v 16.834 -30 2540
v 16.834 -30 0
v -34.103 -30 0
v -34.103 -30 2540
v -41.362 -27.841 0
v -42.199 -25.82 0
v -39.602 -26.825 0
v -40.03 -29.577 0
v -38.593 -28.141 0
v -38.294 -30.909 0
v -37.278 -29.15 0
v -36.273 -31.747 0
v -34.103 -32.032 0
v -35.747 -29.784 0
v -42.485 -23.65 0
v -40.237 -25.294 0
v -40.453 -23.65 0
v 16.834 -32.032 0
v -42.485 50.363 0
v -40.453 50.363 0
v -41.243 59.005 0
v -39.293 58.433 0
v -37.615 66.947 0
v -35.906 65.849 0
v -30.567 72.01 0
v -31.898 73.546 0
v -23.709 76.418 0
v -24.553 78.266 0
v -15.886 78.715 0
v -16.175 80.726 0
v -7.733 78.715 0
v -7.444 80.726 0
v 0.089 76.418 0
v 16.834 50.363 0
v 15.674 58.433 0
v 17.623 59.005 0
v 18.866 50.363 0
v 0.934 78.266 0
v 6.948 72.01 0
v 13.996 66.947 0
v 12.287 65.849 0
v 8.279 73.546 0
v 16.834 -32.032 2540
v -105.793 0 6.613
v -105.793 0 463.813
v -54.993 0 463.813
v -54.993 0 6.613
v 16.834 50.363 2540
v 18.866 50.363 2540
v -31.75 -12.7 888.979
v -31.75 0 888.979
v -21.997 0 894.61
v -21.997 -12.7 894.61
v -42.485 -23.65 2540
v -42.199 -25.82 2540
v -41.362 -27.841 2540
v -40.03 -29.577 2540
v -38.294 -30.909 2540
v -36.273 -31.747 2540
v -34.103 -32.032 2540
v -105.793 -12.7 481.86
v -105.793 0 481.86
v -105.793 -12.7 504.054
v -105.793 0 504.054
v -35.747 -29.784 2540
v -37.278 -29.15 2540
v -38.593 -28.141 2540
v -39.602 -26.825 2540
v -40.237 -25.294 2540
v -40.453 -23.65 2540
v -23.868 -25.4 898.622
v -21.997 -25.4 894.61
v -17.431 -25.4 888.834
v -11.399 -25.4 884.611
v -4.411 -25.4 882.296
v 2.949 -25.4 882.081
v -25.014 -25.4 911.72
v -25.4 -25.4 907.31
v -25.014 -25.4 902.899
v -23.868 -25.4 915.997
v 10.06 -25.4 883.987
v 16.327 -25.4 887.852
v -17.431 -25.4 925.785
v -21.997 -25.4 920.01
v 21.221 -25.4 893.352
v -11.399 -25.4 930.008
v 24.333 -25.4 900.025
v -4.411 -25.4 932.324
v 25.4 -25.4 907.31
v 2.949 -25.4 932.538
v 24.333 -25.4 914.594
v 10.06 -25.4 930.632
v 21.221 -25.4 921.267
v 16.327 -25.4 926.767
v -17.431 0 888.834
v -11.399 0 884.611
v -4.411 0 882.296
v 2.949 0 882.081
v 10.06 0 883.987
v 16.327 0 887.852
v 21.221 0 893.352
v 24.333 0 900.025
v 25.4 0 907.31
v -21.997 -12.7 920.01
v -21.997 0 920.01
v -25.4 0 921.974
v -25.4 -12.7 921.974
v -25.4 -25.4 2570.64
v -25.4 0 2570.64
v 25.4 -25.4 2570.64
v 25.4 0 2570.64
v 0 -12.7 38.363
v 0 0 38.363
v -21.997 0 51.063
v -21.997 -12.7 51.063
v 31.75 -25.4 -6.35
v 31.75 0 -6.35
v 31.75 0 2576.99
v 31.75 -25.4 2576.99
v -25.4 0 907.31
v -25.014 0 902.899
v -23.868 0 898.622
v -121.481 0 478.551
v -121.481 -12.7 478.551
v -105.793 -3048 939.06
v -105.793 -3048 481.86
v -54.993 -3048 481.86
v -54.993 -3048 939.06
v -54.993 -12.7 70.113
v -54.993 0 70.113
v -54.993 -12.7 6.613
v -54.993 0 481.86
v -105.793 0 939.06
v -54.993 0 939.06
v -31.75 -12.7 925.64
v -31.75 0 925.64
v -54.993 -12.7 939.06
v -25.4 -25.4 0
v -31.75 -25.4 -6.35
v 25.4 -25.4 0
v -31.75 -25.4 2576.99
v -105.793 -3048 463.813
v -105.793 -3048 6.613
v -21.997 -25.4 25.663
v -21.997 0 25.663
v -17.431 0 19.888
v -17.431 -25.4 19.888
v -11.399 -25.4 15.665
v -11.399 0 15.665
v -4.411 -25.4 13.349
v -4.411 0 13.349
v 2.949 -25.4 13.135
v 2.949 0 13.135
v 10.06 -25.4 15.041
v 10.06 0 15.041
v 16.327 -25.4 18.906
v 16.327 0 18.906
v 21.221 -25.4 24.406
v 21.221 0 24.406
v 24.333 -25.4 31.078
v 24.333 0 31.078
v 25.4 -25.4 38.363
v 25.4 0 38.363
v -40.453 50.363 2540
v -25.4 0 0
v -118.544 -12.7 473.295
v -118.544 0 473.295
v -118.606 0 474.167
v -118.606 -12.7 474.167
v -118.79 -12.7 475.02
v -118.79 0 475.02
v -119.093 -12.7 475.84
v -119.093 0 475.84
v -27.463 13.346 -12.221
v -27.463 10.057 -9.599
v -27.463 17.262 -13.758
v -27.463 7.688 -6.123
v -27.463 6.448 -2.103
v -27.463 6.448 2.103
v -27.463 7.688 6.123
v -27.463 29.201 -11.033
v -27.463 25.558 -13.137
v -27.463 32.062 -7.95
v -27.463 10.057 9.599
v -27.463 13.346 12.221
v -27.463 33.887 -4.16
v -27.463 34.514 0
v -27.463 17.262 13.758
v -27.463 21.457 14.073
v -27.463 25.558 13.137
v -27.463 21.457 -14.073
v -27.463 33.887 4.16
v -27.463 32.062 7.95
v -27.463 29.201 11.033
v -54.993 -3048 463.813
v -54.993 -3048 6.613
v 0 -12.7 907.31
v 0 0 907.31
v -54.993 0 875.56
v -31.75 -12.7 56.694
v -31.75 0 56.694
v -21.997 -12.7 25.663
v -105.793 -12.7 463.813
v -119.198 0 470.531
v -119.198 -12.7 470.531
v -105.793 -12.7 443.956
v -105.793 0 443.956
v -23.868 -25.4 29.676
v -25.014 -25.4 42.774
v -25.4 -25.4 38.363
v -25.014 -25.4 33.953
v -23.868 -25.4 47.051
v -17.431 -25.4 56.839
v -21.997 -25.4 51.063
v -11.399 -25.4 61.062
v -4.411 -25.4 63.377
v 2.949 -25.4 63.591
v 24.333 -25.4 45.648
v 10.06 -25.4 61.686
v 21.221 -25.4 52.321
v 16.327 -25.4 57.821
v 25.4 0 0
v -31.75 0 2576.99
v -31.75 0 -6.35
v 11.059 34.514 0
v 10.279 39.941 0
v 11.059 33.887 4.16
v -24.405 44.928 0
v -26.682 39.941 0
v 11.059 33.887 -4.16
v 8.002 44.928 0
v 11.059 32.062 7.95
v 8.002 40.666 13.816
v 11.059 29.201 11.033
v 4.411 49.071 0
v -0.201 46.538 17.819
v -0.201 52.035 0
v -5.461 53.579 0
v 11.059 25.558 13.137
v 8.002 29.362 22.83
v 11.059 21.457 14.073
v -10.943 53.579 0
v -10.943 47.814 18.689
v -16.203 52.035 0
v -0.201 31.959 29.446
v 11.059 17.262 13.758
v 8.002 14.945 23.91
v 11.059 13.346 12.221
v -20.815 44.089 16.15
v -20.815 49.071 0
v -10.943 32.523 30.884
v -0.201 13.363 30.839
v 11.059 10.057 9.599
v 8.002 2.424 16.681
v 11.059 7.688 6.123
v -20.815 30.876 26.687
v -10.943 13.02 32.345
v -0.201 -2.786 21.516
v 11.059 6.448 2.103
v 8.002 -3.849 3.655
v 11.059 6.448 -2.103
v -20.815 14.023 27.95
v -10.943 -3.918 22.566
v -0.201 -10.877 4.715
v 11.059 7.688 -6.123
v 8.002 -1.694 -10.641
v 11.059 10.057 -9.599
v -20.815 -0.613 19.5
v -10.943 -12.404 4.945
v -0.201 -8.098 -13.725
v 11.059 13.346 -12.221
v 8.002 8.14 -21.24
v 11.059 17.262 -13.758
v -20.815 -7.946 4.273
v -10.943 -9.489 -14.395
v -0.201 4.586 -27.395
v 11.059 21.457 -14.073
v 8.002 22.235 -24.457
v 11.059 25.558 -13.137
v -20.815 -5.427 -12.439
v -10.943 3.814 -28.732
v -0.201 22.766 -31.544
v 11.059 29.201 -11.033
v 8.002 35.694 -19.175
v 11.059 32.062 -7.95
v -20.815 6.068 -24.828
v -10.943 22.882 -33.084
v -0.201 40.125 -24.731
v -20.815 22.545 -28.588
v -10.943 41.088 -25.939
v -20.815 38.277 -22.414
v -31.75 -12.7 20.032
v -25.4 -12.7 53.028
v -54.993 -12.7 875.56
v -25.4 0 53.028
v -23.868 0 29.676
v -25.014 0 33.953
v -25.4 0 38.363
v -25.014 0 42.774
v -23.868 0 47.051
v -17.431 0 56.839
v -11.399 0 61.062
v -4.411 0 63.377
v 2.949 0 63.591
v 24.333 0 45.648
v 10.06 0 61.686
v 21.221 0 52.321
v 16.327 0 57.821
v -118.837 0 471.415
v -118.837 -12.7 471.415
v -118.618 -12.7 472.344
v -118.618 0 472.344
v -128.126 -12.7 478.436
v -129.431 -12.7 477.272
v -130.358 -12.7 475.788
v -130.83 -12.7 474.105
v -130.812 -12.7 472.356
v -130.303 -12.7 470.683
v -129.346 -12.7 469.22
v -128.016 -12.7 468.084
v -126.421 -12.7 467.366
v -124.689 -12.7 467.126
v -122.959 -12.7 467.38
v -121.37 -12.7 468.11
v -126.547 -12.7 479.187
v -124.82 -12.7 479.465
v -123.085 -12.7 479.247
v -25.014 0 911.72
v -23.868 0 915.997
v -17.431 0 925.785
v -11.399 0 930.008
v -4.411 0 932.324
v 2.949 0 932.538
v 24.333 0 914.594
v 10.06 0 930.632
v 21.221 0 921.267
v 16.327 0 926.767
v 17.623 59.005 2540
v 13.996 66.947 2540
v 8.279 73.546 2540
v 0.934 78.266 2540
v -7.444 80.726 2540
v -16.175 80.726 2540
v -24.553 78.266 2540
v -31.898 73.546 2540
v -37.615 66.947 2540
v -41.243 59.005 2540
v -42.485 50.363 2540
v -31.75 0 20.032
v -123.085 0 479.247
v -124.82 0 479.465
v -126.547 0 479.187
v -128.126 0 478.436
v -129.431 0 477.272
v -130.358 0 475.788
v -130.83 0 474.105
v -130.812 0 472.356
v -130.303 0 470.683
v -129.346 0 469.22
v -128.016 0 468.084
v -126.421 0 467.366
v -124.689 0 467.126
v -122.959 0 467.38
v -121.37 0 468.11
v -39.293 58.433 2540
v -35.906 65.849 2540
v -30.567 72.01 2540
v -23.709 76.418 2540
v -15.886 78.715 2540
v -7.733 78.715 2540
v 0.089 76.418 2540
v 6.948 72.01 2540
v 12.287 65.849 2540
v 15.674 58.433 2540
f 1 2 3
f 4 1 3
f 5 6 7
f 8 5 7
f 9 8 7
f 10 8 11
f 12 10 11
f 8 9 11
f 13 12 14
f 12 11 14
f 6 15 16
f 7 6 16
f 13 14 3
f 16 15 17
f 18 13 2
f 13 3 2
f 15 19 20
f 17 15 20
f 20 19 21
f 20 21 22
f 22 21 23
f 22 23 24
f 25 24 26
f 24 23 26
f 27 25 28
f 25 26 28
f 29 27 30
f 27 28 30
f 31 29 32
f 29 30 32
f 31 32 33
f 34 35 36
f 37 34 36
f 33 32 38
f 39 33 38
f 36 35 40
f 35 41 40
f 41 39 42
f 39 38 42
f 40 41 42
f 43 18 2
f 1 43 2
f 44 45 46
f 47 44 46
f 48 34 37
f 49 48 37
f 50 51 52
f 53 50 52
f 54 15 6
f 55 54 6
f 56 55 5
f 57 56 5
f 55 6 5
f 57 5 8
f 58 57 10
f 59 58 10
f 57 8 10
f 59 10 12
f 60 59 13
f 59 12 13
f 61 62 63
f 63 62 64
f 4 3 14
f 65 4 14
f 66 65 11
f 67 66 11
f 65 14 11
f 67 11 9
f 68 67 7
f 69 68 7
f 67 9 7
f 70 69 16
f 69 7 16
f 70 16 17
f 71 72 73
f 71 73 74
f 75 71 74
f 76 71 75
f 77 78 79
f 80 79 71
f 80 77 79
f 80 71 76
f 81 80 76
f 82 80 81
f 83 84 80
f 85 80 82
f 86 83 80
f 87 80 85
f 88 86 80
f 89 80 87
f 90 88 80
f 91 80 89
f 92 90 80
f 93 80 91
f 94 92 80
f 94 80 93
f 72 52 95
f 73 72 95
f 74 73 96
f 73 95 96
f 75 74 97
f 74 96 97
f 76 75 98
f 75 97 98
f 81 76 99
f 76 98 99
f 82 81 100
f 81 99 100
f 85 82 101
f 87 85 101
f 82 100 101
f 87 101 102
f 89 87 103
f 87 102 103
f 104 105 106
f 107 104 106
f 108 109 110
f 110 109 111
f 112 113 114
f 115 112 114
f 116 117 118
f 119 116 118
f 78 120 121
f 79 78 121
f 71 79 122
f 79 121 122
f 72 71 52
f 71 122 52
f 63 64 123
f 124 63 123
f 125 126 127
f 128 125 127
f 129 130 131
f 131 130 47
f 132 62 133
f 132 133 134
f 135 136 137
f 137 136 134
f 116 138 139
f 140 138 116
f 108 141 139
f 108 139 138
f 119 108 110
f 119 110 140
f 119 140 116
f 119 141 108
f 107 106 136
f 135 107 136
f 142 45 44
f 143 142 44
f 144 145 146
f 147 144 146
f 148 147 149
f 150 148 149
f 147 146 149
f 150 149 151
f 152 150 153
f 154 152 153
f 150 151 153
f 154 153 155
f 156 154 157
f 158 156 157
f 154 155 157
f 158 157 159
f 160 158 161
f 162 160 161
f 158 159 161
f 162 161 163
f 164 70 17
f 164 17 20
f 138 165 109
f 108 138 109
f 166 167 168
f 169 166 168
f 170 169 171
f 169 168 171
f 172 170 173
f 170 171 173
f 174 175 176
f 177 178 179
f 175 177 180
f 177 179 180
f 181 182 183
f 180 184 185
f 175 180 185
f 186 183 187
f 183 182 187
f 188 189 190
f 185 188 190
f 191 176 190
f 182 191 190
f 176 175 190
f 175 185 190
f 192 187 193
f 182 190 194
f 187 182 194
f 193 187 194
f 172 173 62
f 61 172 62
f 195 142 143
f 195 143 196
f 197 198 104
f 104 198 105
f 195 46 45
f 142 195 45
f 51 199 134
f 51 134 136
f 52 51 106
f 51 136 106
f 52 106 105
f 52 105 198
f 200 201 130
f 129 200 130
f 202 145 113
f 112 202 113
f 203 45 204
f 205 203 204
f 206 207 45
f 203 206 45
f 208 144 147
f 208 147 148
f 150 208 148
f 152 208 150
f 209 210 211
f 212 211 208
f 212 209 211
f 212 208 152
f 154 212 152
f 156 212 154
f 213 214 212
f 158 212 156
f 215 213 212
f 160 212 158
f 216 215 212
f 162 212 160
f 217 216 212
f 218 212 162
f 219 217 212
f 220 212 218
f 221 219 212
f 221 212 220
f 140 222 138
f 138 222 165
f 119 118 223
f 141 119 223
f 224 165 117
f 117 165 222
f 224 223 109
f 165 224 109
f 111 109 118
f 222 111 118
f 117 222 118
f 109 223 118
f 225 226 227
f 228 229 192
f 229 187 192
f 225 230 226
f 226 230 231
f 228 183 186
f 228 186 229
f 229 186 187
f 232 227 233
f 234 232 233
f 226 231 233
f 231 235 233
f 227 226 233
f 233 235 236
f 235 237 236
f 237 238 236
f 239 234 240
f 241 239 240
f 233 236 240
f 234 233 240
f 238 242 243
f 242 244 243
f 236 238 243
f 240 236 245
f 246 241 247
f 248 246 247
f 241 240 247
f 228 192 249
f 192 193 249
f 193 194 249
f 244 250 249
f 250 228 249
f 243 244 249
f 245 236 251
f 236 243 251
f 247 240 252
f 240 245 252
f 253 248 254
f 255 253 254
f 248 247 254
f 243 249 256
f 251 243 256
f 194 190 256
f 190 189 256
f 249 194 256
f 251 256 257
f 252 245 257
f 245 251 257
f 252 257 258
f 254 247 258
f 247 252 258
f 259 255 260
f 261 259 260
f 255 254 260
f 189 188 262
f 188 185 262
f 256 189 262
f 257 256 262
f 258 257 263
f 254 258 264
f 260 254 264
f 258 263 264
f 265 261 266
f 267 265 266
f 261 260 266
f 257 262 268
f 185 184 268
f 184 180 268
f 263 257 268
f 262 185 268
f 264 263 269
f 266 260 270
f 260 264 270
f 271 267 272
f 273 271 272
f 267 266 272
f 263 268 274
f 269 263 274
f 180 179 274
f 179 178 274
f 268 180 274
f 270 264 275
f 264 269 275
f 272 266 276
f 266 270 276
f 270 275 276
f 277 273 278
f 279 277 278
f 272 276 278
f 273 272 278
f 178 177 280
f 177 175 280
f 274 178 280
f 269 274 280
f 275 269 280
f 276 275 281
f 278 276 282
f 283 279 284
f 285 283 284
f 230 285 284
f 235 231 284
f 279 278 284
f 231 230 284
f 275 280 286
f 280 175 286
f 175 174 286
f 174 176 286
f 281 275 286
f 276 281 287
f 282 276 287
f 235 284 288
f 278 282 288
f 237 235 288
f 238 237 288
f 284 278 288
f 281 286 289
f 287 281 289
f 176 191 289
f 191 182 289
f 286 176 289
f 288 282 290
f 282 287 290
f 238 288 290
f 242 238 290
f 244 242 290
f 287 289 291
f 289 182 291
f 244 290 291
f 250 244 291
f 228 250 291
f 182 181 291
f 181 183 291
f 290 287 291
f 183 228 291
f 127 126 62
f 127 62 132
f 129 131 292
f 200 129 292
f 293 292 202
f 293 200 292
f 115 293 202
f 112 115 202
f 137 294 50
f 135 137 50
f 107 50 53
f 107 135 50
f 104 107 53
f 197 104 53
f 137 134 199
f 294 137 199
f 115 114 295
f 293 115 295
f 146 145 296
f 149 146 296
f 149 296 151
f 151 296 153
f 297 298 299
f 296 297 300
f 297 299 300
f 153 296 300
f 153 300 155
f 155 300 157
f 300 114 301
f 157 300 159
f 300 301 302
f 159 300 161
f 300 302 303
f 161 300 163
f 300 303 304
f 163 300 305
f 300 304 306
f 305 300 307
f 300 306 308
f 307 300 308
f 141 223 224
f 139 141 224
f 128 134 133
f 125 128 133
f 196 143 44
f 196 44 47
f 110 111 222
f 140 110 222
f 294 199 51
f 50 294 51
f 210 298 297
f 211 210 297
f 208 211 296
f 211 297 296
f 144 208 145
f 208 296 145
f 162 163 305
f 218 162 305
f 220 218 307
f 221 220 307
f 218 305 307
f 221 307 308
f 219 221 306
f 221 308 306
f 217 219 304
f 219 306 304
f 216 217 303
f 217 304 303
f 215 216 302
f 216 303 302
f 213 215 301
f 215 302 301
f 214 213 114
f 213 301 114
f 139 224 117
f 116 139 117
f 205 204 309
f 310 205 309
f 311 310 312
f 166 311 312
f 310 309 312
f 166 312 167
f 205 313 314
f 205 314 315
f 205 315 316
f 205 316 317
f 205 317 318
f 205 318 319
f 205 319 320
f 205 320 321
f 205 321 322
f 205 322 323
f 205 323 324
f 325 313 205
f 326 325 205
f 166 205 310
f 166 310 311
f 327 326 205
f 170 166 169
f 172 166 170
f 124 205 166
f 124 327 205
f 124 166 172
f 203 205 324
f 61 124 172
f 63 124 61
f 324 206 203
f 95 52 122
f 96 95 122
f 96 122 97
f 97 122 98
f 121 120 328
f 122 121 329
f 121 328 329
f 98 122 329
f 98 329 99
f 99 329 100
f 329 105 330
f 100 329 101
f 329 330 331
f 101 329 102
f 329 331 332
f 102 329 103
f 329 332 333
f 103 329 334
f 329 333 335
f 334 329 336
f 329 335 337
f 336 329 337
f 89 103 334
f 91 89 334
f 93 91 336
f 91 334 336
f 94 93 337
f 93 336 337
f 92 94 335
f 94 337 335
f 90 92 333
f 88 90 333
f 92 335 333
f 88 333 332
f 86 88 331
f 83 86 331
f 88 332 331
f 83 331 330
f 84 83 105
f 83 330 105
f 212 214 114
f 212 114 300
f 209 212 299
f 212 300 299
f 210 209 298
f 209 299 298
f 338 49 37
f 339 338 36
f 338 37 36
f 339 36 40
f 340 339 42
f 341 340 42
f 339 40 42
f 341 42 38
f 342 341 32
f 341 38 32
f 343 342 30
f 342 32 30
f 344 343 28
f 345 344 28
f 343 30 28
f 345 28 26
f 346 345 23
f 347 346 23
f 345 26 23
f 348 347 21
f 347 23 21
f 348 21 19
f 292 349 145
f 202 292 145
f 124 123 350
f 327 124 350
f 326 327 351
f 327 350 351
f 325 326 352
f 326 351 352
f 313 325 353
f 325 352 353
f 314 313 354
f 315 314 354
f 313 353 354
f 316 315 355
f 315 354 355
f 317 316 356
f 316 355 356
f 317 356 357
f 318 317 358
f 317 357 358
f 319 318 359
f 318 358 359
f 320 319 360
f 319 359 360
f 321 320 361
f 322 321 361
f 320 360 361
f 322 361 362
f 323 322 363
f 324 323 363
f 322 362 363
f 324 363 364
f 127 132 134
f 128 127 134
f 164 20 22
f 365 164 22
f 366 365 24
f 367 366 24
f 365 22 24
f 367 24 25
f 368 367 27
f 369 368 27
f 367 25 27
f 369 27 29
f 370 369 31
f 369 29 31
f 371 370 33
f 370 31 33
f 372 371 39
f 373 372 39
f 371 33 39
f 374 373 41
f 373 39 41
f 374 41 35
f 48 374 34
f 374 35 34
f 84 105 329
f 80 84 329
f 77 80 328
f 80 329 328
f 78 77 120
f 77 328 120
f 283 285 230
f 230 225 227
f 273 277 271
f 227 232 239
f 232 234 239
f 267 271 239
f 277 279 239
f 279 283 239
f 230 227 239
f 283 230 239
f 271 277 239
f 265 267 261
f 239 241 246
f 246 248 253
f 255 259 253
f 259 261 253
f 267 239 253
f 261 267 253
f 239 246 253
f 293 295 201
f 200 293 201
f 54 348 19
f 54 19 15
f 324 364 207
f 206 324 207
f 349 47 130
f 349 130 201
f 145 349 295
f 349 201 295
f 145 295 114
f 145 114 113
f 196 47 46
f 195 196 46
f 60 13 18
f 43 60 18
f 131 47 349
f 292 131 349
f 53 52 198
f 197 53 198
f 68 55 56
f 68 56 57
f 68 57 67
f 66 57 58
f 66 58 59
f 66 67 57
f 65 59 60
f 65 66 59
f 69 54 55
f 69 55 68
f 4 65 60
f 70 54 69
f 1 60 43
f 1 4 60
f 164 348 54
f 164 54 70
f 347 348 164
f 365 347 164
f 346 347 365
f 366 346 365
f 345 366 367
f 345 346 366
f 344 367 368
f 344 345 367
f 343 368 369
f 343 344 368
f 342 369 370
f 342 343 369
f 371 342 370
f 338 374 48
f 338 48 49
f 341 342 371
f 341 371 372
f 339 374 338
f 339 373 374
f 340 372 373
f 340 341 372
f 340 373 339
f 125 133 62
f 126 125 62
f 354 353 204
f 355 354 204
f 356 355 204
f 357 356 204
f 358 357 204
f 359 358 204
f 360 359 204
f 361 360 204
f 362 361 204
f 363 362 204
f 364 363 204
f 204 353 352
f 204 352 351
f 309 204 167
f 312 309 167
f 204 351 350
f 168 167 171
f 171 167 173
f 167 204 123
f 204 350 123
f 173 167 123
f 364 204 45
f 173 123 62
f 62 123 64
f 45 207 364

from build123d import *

# Parameters (mm, degrees)
F1_DEPTH = 2540
F4_DEPTH = 25.4
F5_DEPTH = 25.4
F6_DEPTH = 3048
F7_DEPTH = 12.7


with BuildPart() as f1:
    # F0 (on Top) → F1 (new body)
    with BuildSketch(Plane.XY):
        with BuildLine():
            ThreePointArc((-34.1031024396, -30.0004556775), (-38.5932305002, -28.140583738), (-40.4531024396, -23.6504556775))
            Line((-40.4531024396, -23.6504556775), (-40.4531024396, 50.3627583385))
            ThreePointArc((-40.4531024396, 50.3627583385), (-11.8095632643, 79.0062975138), (16.8339759111, 50.3627583385))
            Line((16.8339759111, 50.3627583385), (18.8659759111, 50.3627583385))
            ThreePointArc((18.8659759111, 50.3627583385), (-11.8095632643, 81.0382975138), (-42.4851024396, 50.3627583385))
            Line((-42.4851024396, 50.3627583385), (-42.4851024396, -23.6504556775))
            ThreePointArc((-42.4851024396, -23.6504556775), (-40.0300714795, -29.5774247174), (-34.1031024396, -32.0324556775))
            Line((-34.1031024396, -32.0324556775), (16.8339759111, -32.0324556775))
            Line((16.8339759111, -32.0324556775), (16.8339759111, -30.0004556775))
            Line((16.8339759111, -30.0004556775), (-34.1031024396, -30.0004556775))
        make_face()
    extrude(amount=F1_DEPTH)


with BuildPart() as f2:
    # F0 (on Top) → F2 (revolve)
    with BuildSketch(Plane.XY):
        with BuildLine():
            Line((11.0591379926, 20.402347669), (11.0591379926, 34.5144569874))
            ThreePointArc((11.0591379926, 34.5144569874), (-8.201779332, 53.775374312), (-27.4626966566, 34.5144569874))
            Line((-27.4626966566, 34.5144569874), (-27.4626966566, 20.402347669))
            Line((-27.4626966566, 20.402347669), (11.0591379926, 20.402347669))
        make_face()
    revolve(axis=Axis((-8.201779332, 20.402347669, 0), (1, 0, 0)))


with BuildPart() as f4:
    # F3 (on Front) → F4 (new body)
    with BuildSketch(Plane.XZ):
        Polygon((-31.75, 888.9787460817), (-31.75, 56.6941154313), (-25.4, 53.0279412219), (-25.4, 892.644920291), align=None)
        Polygon((-25.4, 53.0279412219), (-31.75, 56.6941154313), (-31.75, 20.0323733378), (-25.4, 23.6985475471), (-25.4, 38.3632443845), align=None)
        Polygon((-25.4, 23.6985475471), (-31.75, 20.0323733378), (-31.75, -6.35), (31.75, -6.35), (31.75, 2576.9899427727), (-31.75, 2576.9899427727), (-31.75, 925.6404881752), (-25.4, 921.9743139658), (-25.4, 2570.6399427727), (25.4, 2570.6399427727), (25.4, 907.3096171284), (25.4, 38.3632443845), (25.4, 0), (-25.4, 0), align=None)
        Polygon((-31.75, 925.6404881752), (-31.75, 888.9787460817), (-25.4, 892.644920291), (-25.4, 907.3096171284), (-25.4, 921.9743139658), align=None)
    extrude(amount=F4_DEPTH)


with BuildPart() as f5:
    # F3 (on Front) → F5 (new body)
    with BuildSketch(Plane.XZ):
        with BuildLine():
            Line((0, 907.3096171284), (-21.9970452561, 894.6096171284))
            ThreePointArc((-21.9970452561, 894.6096171284), (6.5740037456, 882.7751011407), (25.4, 907.3096171284))
            ThreePointArc((25.4, 907.3096171284), (6.5740037456, 931.8441331162), (-21.9970452561, 920.0096171284))
            Line((-21.9970452561, 920.0096171284), (0, 907.3096171284))
        make_face()
        with BuildLine():
            ThreePointArc((-21.9970452561, 920.0096171284), (-24.5345159877, 913.883620874), (-25.4, 907.3096171284))
            ThreePointArc((-25.4, 907.3096171284), (-24.5345159877, 900.7356133828), (-21.9970452561, 894.6096171284))
            Line((-21.9970452561, 894.6096171284), (0, 907.3096171284))
            Line((0, 907.3096171284), (-21.9970452561, 920.0096171284))
        make_face()
    extrude(amount=F5_DEPTH)


with BuildPart() as f5b:
    # F3 (on Front) → F5, piece 2 (new body)
    with BuildSketch(Plane.XZ):
        with BuildLine():
            ThreePointArc((25.4, 38.3632443845), (6.5740037456, 62.8977603723), (-21.9970452561, 51.0632443845))
            Line((-21.9970452561, 51.0632443845), (0, 38.3632443845))
            Line((0, 38.3632443845), (-21.9970452561, 25.6632443845))
            ThreePointArc((-21.9970452561, 25.6632443845), (6.5740037456, 13.8287283968), (25.4, 38.3632443845))
        make_face()
        with BuildLine():
            ThreePointArc((-21.9970452561, 51.0632443845), (-24.5345159877, 44.9372481301), (-25.4, 38.3632443845))
            ThreePointArc((-25.4, 38.3632443845), (-24.5345159877, 31.7892406389), (-21.9970452561, 25.6632443845))
            Line((-21.9970452561, 25.6632443845), (0, 38.3632443845))
            Line((0, 38.3632443845), (-21.9970452561, 51.0632443845))
        make_face()
    extrude(amount=F5_DEPTH)


with BuildPart() as f6:
    # F3 (on Front) → F6 (new body)
    with BuildSketch(Plane.XZ):
        Polygon((-54.9926131403, 463.8132443845), (-105.7926131403, 463.8132443845), (-105.7926131403, 443.9561963081), (-105.7926131403, 6.6132443845), (-54.9926131403, 6.6132443845), (-54.9926131403, 70.1132443845), align=None)
    extrude(amount=F6_DEPTH)


with BuildPart() as f6b:
    # F3 (on Front) → F6, piece 2 (new body)
    with BuildSketch(Plane.XZ):
        Polygon((-105.7926131403, 939.0596171284), (-105.7926131403, 504.0543675423), (-105.7926131403, 481.8596171284), (-54.9926131403, 481.8596171284), (-54.9926131403, 875.5596171284), (-54.9926131403, 939.0596171284), align=None)
    extrude(amount=F6_DEPTH)


with BuildPart() as f7:
    # F3 (on Front) → F7 (new body)
    with BuildSketch(Plane.XZ):
        Polygon((-31.75, 56.6941154313), (-54.9926131403, 70.1132443845), (-54.9926131403, 6.6132443845), (-31.75, 20.0323733378), align=None)
        Polygon((-25.4, 53.0279412219), (-31.75, 56.6941154313), (-31.75, 20.0323733378), (-25.4, 23.6985475471), (-25.4, 38.3632443845), align=None)
        with BuildLine():
            Line((-21.9970452561, 51.0632443845), (-25.4, 53.0279412219))
            Line((-25.4, 53.0279412219), (-25.4, 38.3632443845))
            ThreePointArc((-25.4, 38.3632443845), (-24.5345159877, 44.9372481301), (-21.9970452561, 51.0632443845))
        make_face()
        with BuildLine():
            Line((-25.4, 38.3632443845), (-25.4, 23.6985475471))
            Line((-25.4, 23.6985475471), (-21.9970452561, 25.6632443845))
            ThreePointArc((-21.9970452561, 25.6632443845), (-24.5345159877, 31.7892406389), (-25.4, 38.3632443845))
        make_face()
        with BuildLine():
            ThreePointArc((-21.9970452561, 51.0632443845), (-24.5345159877, 44.9372481301), (-25.4, 38.3632443845))
            ThreePointArc((-25.4, 38.3632443845), (-24.5345159877, 31.7892406389), (-21.9970452561, 25.6632443845))
            Line((-21.9970452561, 25.6632443845), (0, 38.3632443845))
            Line((0, 38.3632443845), (-21.9970452561, 51.0632443845))
        make_face()
    extrude(amount=F7_DEPTH)


with BuildPart() as f7b:
    # F3 (on Front) → F7, piece 2 (new body)
    with BuildSketch(Plane.XZ):
        with BuildLine():
            Line((-105.7926131403, 443.9561963081), (-105.7926131403, 463.8132443845))
            Line((-105.7926131403, 463.8132443845), (-119.1975950117, 470.5311259368))
            ThreePointArc((-119.1975950117, 470.5311259368), (-120.1212492294, 469.1750010214), (-121.3696791125, 468.1102781809))
            Line((-121.3696791125, 468.1102781809), (-105.7926131403, 443.9561963081))
        make_face()
        with BuildLine():
            Line((-105.7926131403, 504.0543675423), (-121.4809104986, 478.5507489636))
            ThreePointArc((-121.4809104986, 478.5507489636), (-120.0838953154, 477.3739435095), (-119.0926562734, 475.8396789754))
            Line((-119.0926562734, 475.8396789754), (-105.7926131403, 481.8596171284))
            Line((-105.7926131403, 481.8596171284), (-105.7926131403, 504.0543675423))
        make_face()
        with BuildLine():
            Line((-124.7136369348, 473.2954800129), (-119.1975950117, 470.5311259368))
            ThreePointArc((-119.1975950117, 470.5311259368), (-118.709383668, 471.8751579844), (-118.5436797262, 473.2954800129))
            ThreePointArc((-118.5436797262, 473.2954800129), (-118.6824852161, 474.5968565543), (-119.0926562734, 475.8396789754))
            Line((-119.0926562734, 475.8396789754), (-124.7136369348, 473.2954800129))
        make_face()
        with BuildLine():
            ThreePointArc((-121.4809104986, 478.5507489636), (-130.883244013, 473.2297498403), (-121.3696791125, 468.1102781809))
            Line((-121.3696791125, 468.1102781809), (-124.7136369348, 473.2954800129))
            Line((-124.7136369348, 473.2954800129), (-121.4809104986, 478.5507489636))
        make_face()
        with BuildLine():
            Line((-121.4809104986, 478.5507489636), (-124.7136369348, 473.2954800129))
            Line((-124.7136369348, 473.2954800129), (-119.0926562734, 475.8396789754))
            ThreePointArc((-119.0926562734, 475.8396789754), (-120.0838953154, 477.3739435095), (-121.4809104986, 478.5507489636))
        make_face()
        with BuildLine():
            ThreePointArc((-121.3696791125, 468.1102781809), (-120.1212492294, 469.1750010214), (-119.1975950117, 470.5311259368))
            Line((-119.1975950117, 470.5311259368), (-124.7136369348, 473.2954800129))
            Line((-124.7136369348, 473.2954800129), (-121.3696791125, 468.1102781809))
        make_face()
    extrude(amount=F7_DEPTH)


with BuildPart() as f7c:
    # F3 (on Front) → F7, piece 3 (new body)
    with BuildSketch(Plane.XZ):
        Polygon((-54.9926131403, 875.5596171284), (-31.75, 888.9787460817), (-31.75, 925.6404881752), (-54.9926131403, 939.0596171284), align=None)
        Polygon((-31.75, 925.6404881752), (-31.75, 888.9787460817), (-25.4, 892.644920291), (-25.4, 907.3096171284), (-25.4, 921.9743139658), align=None)
        with BuildLine():
            ThreePointArc((-21.9970452561, 920.0096171284), (-24.5345159877, 913.883620874), (-25.4, 907.3096171284))
            ThreePointArc((-25.4, 907.3096171284), (-24.5345159877, 900.7356133828), (-21.9970452561, 894.6096171284))
            Line((-21.9970452561, 894.6096171284), (0, 907.3096171284))
            Line((0, 907.3096171284), (-21.9970452561, 920.0096171284))
        make_face()
        with BuildLine():
            Line((-21.9970452561, 920.0096171284), (-25.4, 921.9743139658))
            Line((-25.4, 921.9743139658), (-25.4, 907.3096171284))
            ThreePointArc((-25.4, 907.3096171284), (-24.5345159877, 913.883620874), (-21.9970452561, 920.0096171284))
        make_face()
        with BuildLine():
            Line((-25.4, 907.3096171284), (-25.4, 892.644920291))
            Line((-25.4, 892.644920291), (-21.9970452561, 894.6096171284))
            ThreePointArc((-21.9970452561, 894.6096171284), (-24.5345159877, 900.7356133828), (-25.4, 907.3096171284))
        make_face()
    extrude(amount=F7_DEPTH)


solid = Compound([f1.part, f2.part, f4.part, f5.part, f5b.part, f6.part, f6b.part, f7.part, f7b.part, f7c.part])
